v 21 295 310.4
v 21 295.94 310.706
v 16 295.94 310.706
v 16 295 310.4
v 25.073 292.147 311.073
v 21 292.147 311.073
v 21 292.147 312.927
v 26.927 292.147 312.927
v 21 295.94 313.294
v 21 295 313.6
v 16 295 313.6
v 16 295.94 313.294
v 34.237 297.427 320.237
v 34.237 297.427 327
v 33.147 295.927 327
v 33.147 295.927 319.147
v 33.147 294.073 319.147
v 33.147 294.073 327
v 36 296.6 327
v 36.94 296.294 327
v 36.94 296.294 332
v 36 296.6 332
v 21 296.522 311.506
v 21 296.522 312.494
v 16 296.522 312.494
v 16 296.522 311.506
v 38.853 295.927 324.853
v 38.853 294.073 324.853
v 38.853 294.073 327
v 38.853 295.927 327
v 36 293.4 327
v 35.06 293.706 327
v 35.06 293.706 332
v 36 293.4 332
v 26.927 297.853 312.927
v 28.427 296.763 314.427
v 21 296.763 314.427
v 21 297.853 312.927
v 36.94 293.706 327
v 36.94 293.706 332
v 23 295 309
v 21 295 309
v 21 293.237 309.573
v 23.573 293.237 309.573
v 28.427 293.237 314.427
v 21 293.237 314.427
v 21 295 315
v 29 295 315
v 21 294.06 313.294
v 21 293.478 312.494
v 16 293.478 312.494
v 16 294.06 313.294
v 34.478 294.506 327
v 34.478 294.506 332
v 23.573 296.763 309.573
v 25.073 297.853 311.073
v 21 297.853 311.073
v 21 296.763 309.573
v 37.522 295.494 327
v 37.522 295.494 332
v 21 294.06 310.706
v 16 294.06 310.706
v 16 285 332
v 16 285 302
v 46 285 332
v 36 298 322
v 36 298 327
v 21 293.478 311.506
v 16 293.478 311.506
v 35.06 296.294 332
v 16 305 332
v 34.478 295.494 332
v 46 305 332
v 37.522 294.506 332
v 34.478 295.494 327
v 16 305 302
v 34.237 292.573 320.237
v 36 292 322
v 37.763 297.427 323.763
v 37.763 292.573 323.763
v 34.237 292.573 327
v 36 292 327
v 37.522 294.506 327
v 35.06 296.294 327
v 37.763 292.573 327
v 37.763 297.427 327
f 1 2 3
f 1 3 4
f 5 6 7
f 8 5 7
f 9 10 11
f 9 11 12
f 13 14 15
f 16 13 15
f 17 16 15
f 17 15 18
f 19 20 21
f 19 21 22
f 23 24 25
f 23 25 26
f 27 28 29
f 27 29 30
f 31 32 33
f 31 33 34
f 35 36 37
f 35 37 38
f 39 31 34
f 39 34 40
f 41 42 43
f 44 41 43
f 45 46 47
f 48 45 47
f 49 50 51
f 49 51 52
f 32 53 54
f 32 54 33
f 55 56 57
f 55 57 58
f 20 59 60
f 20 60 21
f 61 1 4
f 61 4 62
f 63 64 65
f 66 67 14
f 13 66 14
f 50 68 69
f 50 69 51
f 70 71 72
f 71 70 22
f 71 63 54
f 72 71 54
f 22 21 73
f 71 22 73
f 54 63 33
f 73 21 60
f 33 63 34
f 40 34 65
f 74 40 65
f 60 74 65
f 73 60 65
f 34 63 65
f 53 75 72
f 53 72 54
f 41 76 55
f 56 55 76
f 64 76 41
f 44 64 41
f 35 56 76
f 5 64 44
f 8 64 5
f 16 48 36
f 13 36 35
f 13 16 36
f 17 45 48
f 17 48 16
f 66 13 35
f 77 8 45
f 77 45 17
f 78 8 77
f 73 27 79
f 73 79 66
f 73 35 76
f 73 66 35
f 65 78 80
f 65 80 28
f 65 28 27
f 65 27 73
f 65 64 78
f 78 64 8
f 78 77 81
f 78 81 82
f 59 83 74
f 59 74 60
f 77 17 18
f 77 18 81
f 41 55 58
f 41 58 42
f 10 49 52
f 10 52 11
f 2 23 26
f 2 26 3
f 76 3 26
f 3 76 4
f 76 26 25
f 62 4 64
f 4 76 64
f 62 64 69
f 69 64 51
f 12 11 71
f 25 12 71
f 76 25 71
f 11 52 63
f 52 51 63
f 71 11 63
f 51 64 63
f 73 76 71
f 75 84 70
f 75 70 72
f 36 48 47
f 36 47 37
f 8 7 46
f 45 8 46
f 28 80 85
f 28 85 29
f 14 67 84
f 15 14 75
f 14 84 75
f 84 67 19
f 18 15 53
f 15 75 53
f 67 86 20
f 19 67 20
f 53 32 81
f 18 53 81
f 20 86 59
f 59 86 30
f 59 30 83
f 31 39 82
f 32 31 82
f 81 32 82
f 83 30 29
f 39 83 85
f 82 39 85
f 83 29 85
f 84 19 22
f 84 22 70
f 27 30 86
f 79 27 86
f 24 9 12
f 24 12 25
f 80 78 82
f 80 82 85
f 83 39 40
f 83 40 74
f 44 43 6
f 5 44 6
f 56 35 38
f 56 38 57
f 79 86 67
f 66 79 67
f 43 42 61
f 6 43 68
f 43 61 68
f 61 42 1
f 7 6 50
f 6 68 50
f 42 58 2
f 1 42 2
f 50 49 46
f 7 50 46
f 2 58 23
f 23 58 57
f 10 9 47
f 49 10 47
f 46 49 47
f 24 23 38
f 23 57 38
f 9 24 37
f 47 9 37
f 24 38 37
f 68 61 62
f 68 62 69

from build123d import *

# Parameters (mm, degrees)
PRISM094_DEPTH                = 30
PRISM094_PITCH_ANGLE          = 90
PRISM095_DEPTH                = 10
PRISM095_PITCH_ANGLE          = 90
PRISM096_DEPTH                = 30
PRISM096_ROLL_ANGLE           = 90
PRISM097_DEPTH                = 10
PRISM097_ROLL_ANGLE           = 90
CUBE092_W                     = 60
CUBE092_H                     = 30
CUBE092_DEPTH                 = 20
CUBE092_PLACEMENT_ANGLE       = 45
CUBE091_W                     = 30
CUBE091_H                     = 30
CUBE091_DEPTH                 = 20
DIFFERENCE055_PITCH_ANGLE     = -90
DIFFERENCE055_PLACEMENT_ANGLE = -90


with BuildPart() as prism094:
    # prism094 → prism094 (new body)
    with BuildSketch(Plane.XY):
        Polygon((1.6, 0), (1.294427, 0.940456), (0.494427, 1.52169), (-0.494427, 1.52169), (-1.294427, 0.940456), (-1.6, 0), (-1.294427, -0.940456), (-0.494427, -1.52169), (0.494427, -1.52169), (1.294427, -0.940456), align=None)
    extrude(amount=PRISM094_DEPTH)


with BuildPart() as prism094_1:
    # prism094 pitch: moved
    add(prism094.part.rotate(Axis((0, 0, 0), (0, 1, 0)), PRISM094_PITCH_ANGLE))


with BuildPart() as prism094_2:
    # prism094 placement: moved
    add(prism094_1.part.moved(Location((5, 20, 10))))


with BuildPart() as prism095:
    # prism095 → prism095 (new body)
    with BuildSketch(Plane.XY):
        Polygon((3, 0), (2.427051, 1.763356), (0.927051, 2.85317), (-0.927051, 2.85317), (-2.427051, 1.763356), (-3, 0), (-2.427051, -1.763356), (-0.927051, -2.85317), (0.927051, -2.85317), (2.427051, -1.763356), align=None)
    extrude(amount=PRISM095_DEPTH)


with BuildPart() as prism095_1:
    # prism095 pitch: moved
    add(prism095.part.rotate(Axis((0, 0, 0), (0, 1, 0)), PRISM095_PITCH_ANGLE))


with BuildPart() as prism095_2:
    # prism095 placement: moved
    add(prism095_1.part.moved(Location((15, 20, 10))))


with BuildPart() as prism096:
    # prism096 → prism096 (new body)
    with BuildSketch(Plane.XY):
        Polygon((1.6, 0), (1.294427, 0.940456), (0.494427, 1.52169), (-0.494427, 1.52169), (-1.294427, 0.940456), (-1.6, 0), (-1.294427, -0.940456), (-0.494427, -1.52169), (0.494427, -1.52169), (1.294427, -0.940456), align=None)
    extrude(amount=PRISM096_DEPTH)


with BuildPart() as prism096_1:
    # prism096 roll: moved
    add(prism096.part.rotate(Axis((0, 0, 0), (1, 0, 0)), PRISM096_ROLL_ANGLE))


with BuildPart() as prism096_2:
    # prism096 placement: moved
    add(prism096_1.part.moved(Location((10, 20, 10))))


with BuildPart() as prism097:
    # prism097 → prism097 (new body)
    with BuildSketch(Plane.XY):
        Polygon((3, 0), (2.427051, 1.763356), (0.927051, 2.85317), (-0.927051, 2.85317), (-2.427051, 1.763356), (-3, 0), (-2.427051, -1.763356), (-0.927051, -2.85317), (0.927051, -2.85317), (2.427051, -1.763356), align=None)
    extrude(amount=PRISM097_DEPTH)


with BuildPart() as prism097_1:
    # prism097 roll: moved
    add(prism097.part.rotate(Axis((0, 0, 0), (1, 0, 0)), PRISM097_ROLL_ANGLE))


with BuildPart() as prism097_2:
    # prism097 placement: moved
    add(prism097_1.part.moved(Location((10, 15, 10))))


with BuildPart() as union044:
    # cube092 → cube092 (new body)
    with BuildSketch(Plane.XY):
        with Locations((30, 15)):
            Rectangle(CUBE092_W, CUBE092_H)
    extrude(amount=CUBE092_DEPTH)


with BuildPart() as union044_1:
    # cube092 placement: moved
    add(union044.part.rotate(Axis((0, 0, 0), (0, 0, 1)), CUBE092_PLACEMENT_ANGLE))

    # union044: union prism094, prism095, prism096, prism097
    add(prism094_2.part)
    add(prism095_2.part)
    add(prism096_2.part)
    add(prism097_2.part)


with BuildPart() as difference055:
    # cube091 → cube091 (new body)
    with BuildSketch(Plane.XY):
        with Locations((15, 15)):
            Rectangle(CUBE091_W, CUBE091_H)
    extrude(amount=CUBE091_DEPTH)

    # difference055: cut union044
    add(union044_1.part, mode=Mode.SUBTRACT)


with BuildPart() as difference055_1:
    # difference055 pitch: moved
    add(difference055.part.rotate(Axis((0, 0, 0), (0, 1, 0)), DIFFERENCE055_PITCH_ANGLE))


with BuildPart() as difference055_2:
    # difference055 placement: moved
    add(difference055_1.part.moved(Location((16, 285, 302))).rotate(Axis((16, 285, 302), (0, 0, 1)), DIFFERENCE055_PLACEMENT_ANGLE))


solid = difference055_2.part
